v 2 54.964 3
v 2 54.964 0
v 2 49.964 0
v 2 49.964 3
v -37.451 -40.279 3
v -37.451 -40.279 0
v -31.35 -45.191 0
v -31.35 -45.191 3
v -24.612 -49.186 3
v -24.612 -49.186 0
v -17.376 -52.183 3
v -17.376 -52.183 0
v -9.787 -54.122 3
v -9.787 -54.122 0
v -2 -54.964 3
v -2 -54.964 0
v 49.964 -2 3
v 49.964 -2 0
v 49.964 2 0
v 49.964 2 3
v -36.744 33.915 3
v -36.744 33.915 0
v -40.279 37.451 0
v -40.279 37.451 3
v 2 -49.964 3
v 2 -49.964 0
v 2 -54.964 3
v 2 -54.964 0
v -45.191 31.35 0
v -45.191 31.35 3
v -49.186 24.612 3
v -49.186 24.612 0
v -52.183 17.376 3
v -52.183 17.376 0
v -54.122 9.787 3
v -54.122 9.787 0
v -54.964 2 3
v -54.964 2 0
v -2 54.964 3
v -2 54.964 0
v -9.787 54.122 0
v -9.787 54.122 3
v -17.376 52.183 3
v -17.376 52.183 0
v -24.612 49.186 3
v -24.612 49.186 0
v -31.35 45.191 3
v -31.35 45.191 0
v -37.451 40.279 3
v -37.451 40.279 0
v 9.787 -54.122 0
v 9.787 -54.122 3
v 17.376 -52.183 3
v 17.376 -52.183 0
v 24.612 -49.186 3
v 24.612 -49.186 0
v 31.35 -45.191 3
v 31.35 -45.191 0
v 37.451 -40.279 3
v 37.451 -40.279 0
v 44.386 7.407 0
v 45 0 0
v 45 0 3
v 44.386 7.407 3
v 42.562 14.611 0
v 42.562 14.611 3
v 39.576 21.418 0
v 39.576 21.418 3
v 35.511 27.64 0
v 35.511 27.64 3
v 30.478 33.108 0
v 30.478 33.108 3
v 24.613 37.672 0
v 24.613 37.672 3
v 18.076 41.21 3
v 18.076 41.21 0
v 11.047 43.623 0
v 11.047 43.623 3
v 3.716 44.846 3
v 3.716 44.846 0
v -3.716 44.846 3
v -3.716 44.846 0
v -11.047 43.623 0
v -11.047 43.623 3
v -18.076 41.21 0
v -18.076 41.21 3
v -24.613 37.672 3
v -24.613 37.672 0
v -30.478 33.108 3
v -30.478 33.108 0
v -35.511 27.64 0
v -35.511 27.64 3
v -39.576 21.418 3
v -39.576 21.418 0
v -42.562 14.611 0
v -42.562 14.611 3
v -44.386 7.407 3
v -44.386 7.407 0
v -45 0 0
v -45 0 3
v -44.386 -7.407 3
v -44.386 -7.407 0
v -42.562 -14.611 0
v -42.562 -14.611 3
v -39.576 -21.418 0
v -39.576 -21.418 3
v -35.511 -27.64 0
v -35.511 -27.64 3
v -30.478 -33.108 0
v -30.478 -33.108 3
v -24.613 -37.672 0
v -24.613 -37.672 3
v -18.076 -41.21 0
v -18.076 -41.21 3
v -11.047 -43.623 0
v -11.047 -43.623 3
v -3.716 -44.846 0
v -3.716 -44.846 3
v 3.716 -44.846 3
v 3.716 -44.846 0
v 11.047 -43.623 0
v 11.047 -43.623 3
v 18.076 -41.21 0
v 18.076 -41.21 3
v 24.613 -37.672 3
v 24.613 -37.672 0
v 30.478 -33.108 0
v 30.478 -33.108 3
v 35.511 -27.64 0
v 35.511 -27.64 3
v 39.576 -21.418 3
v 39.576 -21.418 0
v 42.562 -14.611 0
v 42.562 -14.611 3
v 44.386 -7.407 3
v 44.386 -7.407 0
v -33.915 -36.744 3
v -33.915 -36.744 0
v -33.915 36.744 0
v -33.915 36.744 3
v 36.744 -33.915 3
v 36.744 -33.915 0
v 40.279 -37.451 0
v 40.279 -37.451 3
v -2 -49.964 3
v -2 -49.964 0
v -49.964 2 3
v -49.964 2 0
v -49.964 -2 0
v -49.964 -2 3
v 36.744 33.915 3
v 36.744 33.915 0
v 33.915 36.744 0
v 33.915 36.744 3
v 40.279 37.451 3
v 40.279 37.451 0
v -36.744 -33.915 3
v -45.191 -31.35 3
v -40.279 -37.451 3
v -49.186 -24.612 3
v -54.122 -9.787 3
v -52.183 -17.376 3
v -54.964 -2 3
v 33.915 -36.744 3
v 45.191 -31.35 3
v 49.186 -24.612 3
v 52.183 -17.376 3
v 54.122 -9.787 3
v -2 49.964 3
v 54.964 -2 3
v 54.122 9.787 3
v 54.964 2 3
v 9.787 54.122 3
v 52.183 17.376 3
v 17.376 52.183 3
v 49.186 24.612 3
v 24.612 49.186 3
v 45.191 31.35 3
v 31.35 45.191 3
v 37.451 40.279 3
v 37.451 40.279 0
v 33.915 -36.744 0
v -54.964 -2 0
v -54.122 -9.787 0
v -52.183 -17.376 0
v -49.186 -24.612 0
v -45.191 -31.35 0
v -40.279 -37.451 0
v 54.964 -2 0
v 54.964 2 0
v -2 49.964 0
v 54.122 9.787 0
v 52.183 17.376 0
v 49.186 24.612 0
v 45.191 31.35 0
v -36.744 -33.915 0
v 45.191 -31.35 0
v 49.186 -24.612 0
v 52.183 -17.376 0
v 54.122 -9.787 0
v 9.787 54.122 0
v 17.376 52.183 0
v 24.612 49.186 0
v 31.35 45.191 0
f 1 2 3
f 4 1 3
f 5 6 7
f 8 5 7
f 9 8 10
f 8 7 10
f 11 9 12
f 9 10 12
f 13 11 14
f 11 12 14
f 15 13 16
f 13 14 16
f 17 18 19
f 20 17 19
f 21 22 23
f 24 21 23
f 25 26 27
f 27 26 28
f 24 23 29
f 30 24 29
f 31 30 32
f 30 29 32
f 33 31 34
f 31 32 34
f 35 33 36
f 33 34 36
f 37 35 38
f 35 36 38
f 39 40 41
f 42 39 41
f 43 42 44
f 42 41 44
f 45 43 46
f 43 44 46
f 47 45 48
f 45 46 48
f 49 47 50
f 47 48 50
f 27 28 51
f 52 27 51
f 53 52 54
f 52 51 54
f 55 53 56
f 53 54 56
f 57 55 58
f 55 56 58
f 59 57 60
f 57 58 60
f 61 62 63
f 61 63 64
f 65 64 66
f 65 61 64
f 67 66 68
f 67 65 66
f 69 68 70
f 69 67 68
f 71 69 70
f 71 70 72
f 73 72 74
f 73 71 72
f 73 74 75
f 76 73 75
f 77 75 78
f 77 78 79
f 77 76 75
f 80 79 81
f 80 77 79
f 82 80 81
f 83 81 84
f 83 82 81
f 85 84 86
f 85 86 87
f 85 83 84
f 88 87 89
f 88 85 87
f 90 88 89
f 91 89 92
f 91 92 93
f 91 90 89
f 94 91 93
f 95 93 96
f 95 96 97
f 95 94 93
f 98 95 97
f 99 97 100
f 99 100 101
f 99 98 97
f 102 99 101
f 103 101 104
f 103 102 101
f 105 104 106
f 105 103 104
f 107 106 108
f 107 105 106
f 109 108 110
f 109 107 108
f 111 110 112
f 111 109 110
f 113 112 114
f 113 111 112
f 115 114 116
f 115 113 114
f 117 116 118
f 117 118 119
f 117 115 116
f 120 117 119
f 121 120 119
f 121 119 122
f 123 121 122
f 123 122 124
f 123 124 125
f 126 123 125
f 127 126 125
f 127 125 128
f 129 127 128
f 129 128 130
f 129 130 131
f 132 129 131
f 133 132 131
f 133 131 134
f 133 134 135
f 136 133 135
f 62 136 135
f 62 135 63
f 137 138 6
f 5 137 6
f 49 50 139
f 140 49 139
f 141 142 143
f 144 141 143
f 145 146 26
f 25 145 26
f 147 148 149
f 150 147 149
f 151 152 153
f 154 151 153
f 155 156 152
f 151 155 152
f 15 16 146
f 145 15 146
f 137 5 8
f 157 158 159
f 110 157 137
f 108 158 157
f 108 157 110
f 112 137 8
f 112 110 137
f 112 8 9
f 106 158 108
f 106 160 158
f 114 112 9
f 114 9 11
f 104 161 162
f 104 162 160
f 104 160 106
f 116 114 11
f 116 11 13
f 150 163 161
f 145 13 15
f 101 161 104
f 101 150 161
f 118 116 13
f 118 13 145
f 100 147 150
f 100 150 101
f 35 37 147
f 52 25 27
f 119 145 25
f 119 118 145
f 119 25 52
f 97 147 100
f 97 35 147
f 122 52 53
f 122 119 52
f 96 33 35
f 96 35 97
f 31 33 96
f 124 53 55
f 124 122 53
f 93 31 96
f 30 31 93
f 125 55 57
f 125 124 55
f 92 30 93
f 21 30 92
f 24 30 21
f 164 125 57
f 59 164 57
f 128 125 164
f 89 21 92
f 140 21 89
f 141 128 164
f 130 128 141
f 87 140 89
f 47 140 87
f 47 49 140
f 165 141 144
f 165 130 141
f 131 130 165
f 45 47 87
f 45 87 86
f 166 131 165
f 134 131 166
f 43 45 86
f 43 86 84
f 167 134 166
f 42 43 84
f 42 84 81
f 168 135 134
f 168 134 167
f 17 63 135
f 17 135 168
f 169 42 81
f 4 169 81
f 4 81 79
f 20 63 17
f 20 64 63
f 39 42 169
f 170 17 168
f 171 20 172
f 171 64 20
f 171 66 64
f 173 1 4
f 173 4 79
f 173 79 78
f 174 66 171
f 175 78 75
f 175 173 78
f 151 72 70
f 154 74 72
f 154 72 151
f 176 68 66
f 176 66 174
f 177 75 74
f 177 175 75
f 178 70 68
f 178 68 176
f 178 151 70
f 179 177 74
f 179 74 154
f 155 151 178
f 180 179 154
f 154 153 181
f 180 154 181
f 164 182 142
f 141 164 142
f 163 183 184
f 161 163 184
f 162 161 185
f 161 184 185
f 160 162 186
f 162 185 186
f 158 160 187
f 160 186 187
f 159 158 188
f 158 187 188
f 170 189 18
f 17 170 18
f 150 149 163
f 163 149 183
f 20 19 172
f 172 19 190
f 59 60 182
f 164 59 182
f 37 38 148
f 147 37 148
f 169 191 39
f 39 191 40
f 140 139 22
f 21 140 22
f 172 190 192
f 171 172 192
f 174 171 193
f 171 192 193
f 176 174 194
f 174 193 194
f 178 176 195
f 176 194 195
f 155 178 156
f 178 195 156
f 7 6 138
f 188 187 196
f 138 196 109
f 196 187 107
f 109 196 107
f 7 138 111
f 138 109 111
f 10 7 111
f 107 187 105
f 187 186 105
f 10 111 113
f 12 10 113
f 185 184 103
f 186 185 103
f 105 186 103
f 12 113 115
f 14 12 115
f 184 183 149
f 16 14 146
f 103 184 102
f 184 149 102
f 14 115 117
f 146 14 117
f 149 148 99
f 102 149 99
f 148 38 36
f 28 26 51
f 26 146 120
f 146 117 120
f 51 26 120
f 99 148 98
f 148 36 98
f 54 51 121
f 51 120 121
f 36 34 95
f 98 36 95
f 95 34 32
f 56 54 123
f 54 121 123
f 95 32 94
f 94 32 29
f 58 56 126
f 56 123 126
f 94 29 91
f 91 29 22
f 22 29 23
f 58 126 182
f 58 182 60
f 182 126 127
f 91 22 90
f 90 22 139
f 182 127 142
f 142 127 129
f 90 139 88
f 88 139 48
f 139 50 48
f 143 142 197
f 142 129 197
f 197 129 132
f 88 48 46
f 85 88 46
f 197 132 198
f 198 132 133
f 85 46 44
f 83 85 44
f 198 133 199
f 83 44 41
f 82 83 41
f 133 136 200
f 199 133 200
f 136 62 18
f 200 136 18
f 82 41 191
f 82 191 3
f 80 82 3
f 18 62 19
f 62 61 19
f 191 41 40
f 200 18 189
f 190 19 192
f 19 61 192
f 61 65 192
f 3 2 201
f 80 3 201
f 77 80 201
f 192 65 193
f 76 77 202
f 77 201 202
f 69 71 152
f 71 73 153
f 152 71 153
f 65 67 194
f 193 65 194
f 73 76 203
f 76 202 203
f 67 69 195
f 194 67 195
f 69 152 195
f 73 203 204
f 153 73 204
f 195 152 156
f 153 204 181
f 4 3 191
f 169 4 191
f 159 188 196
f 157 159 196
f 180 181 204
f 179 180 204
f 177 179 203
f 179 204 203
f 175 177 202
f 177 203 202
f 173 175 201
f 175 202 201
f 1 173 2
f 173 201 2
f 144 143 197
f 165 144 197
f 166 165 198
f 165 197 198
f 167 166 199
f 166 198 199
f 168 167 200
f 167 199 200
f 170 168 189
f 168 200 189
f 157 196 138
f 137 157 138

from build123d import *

# Parameters (mm, degrees)
F0_R     = 45
F1_DEPTH = 3


with BuildPart() as f1:
    # F0 (on Top) → F1 (new body)
    with BuildSketch(Plane.XY):
        with BuildLine():
            Line((49.963624, 2), (54.963624, 2))
            ThreePointArc((54.963624, 2), (50.813374, 21.047589), (40.279365, 37.450938))
            Line((40.279365, 37.450938), (36.743831, 33.915404))
            Line((36.743831, 33.915404), (33.915404, 36.743831))
            Line((33.915404, 36.743831), (37.450938, 40.279365))
            ThreePointArc((37.450938, 40.279365), (21.047589, 50.813374), (2, 54.963624))
            Line((2, 54.963624), (2, 49.963624))
            Line((2, 49.963624), (-2, 49.963624))
            Line((-2, 49.963624), (-2, 54.963624))
            ThreePointArc((-2, 54.963624), (-21.047589, 50.813374), (-37.450938, 40.279365))
            Line((-37.450938, 40.279365), (-33.915404, 36.743831))
            Line((-33.915404, 36.743831), (-36.743831, 33.915404))
            Line((-36.743831, 33.915404), (-40.279365, 37.450938))
            ThreePointArc((-40.279365, 37.450938), (-50.813374, 21.047589), (-54.963624, 2))
            Line((-54.963624, 2), (-49.963624, 2))
            Line((-49.963624, 2), (-49.963624, -2))
            Line((-49.963624, -2), (-54.963624, -2))
            ThreePointArc((-54.963624, -2), (-50.813374, -21.047589), (-40.279365, -37.450938))
            Line((-40.279365, -37.450938), (-36.743831, -33.915404))
            Line((-36.743831, -33.915404), (-33.915404, -36.743831))
            Line((-33.915404, -36.743831), (-37.450938, -40.279365))
            ThreePointArc((-37.450938, -40.279365), (-21.047589, -50.813374), (-2, -54.963624))
            Line((-2, -54.963624), (-2, -49.963624))
            Line((-2, -49.963624), (0, -49.963624))
            Line((0, -49.963624), (2, -49.963624))
            Line((2, -49.963624), (2, -54.963624))
            ThreePointArc((2, -54.963624), (21.047589, -50.813374), (37.450938, -40.279365))
            Line((37.450938, -40.279365), (33.915404, -36.743831))
            Line((33.915404, -36.743831), (36.743831, -33.915404))
            Line((36.743831, -33.915404), (40.279365, -37.450938))
            ThreePointArc((40.279365, -37.450938), (50.813374, -21.047589), (54.963624, -2))
            Line((54.963624, -2), (49.963624, -2))
            Line((49.963624, -2), (49.963624, 2))
        make_face()
        Circle(F0_R, mode=Mode.SUBTRACT)
    extrude(amount=F1_DEPTH)


solid = f1.part
